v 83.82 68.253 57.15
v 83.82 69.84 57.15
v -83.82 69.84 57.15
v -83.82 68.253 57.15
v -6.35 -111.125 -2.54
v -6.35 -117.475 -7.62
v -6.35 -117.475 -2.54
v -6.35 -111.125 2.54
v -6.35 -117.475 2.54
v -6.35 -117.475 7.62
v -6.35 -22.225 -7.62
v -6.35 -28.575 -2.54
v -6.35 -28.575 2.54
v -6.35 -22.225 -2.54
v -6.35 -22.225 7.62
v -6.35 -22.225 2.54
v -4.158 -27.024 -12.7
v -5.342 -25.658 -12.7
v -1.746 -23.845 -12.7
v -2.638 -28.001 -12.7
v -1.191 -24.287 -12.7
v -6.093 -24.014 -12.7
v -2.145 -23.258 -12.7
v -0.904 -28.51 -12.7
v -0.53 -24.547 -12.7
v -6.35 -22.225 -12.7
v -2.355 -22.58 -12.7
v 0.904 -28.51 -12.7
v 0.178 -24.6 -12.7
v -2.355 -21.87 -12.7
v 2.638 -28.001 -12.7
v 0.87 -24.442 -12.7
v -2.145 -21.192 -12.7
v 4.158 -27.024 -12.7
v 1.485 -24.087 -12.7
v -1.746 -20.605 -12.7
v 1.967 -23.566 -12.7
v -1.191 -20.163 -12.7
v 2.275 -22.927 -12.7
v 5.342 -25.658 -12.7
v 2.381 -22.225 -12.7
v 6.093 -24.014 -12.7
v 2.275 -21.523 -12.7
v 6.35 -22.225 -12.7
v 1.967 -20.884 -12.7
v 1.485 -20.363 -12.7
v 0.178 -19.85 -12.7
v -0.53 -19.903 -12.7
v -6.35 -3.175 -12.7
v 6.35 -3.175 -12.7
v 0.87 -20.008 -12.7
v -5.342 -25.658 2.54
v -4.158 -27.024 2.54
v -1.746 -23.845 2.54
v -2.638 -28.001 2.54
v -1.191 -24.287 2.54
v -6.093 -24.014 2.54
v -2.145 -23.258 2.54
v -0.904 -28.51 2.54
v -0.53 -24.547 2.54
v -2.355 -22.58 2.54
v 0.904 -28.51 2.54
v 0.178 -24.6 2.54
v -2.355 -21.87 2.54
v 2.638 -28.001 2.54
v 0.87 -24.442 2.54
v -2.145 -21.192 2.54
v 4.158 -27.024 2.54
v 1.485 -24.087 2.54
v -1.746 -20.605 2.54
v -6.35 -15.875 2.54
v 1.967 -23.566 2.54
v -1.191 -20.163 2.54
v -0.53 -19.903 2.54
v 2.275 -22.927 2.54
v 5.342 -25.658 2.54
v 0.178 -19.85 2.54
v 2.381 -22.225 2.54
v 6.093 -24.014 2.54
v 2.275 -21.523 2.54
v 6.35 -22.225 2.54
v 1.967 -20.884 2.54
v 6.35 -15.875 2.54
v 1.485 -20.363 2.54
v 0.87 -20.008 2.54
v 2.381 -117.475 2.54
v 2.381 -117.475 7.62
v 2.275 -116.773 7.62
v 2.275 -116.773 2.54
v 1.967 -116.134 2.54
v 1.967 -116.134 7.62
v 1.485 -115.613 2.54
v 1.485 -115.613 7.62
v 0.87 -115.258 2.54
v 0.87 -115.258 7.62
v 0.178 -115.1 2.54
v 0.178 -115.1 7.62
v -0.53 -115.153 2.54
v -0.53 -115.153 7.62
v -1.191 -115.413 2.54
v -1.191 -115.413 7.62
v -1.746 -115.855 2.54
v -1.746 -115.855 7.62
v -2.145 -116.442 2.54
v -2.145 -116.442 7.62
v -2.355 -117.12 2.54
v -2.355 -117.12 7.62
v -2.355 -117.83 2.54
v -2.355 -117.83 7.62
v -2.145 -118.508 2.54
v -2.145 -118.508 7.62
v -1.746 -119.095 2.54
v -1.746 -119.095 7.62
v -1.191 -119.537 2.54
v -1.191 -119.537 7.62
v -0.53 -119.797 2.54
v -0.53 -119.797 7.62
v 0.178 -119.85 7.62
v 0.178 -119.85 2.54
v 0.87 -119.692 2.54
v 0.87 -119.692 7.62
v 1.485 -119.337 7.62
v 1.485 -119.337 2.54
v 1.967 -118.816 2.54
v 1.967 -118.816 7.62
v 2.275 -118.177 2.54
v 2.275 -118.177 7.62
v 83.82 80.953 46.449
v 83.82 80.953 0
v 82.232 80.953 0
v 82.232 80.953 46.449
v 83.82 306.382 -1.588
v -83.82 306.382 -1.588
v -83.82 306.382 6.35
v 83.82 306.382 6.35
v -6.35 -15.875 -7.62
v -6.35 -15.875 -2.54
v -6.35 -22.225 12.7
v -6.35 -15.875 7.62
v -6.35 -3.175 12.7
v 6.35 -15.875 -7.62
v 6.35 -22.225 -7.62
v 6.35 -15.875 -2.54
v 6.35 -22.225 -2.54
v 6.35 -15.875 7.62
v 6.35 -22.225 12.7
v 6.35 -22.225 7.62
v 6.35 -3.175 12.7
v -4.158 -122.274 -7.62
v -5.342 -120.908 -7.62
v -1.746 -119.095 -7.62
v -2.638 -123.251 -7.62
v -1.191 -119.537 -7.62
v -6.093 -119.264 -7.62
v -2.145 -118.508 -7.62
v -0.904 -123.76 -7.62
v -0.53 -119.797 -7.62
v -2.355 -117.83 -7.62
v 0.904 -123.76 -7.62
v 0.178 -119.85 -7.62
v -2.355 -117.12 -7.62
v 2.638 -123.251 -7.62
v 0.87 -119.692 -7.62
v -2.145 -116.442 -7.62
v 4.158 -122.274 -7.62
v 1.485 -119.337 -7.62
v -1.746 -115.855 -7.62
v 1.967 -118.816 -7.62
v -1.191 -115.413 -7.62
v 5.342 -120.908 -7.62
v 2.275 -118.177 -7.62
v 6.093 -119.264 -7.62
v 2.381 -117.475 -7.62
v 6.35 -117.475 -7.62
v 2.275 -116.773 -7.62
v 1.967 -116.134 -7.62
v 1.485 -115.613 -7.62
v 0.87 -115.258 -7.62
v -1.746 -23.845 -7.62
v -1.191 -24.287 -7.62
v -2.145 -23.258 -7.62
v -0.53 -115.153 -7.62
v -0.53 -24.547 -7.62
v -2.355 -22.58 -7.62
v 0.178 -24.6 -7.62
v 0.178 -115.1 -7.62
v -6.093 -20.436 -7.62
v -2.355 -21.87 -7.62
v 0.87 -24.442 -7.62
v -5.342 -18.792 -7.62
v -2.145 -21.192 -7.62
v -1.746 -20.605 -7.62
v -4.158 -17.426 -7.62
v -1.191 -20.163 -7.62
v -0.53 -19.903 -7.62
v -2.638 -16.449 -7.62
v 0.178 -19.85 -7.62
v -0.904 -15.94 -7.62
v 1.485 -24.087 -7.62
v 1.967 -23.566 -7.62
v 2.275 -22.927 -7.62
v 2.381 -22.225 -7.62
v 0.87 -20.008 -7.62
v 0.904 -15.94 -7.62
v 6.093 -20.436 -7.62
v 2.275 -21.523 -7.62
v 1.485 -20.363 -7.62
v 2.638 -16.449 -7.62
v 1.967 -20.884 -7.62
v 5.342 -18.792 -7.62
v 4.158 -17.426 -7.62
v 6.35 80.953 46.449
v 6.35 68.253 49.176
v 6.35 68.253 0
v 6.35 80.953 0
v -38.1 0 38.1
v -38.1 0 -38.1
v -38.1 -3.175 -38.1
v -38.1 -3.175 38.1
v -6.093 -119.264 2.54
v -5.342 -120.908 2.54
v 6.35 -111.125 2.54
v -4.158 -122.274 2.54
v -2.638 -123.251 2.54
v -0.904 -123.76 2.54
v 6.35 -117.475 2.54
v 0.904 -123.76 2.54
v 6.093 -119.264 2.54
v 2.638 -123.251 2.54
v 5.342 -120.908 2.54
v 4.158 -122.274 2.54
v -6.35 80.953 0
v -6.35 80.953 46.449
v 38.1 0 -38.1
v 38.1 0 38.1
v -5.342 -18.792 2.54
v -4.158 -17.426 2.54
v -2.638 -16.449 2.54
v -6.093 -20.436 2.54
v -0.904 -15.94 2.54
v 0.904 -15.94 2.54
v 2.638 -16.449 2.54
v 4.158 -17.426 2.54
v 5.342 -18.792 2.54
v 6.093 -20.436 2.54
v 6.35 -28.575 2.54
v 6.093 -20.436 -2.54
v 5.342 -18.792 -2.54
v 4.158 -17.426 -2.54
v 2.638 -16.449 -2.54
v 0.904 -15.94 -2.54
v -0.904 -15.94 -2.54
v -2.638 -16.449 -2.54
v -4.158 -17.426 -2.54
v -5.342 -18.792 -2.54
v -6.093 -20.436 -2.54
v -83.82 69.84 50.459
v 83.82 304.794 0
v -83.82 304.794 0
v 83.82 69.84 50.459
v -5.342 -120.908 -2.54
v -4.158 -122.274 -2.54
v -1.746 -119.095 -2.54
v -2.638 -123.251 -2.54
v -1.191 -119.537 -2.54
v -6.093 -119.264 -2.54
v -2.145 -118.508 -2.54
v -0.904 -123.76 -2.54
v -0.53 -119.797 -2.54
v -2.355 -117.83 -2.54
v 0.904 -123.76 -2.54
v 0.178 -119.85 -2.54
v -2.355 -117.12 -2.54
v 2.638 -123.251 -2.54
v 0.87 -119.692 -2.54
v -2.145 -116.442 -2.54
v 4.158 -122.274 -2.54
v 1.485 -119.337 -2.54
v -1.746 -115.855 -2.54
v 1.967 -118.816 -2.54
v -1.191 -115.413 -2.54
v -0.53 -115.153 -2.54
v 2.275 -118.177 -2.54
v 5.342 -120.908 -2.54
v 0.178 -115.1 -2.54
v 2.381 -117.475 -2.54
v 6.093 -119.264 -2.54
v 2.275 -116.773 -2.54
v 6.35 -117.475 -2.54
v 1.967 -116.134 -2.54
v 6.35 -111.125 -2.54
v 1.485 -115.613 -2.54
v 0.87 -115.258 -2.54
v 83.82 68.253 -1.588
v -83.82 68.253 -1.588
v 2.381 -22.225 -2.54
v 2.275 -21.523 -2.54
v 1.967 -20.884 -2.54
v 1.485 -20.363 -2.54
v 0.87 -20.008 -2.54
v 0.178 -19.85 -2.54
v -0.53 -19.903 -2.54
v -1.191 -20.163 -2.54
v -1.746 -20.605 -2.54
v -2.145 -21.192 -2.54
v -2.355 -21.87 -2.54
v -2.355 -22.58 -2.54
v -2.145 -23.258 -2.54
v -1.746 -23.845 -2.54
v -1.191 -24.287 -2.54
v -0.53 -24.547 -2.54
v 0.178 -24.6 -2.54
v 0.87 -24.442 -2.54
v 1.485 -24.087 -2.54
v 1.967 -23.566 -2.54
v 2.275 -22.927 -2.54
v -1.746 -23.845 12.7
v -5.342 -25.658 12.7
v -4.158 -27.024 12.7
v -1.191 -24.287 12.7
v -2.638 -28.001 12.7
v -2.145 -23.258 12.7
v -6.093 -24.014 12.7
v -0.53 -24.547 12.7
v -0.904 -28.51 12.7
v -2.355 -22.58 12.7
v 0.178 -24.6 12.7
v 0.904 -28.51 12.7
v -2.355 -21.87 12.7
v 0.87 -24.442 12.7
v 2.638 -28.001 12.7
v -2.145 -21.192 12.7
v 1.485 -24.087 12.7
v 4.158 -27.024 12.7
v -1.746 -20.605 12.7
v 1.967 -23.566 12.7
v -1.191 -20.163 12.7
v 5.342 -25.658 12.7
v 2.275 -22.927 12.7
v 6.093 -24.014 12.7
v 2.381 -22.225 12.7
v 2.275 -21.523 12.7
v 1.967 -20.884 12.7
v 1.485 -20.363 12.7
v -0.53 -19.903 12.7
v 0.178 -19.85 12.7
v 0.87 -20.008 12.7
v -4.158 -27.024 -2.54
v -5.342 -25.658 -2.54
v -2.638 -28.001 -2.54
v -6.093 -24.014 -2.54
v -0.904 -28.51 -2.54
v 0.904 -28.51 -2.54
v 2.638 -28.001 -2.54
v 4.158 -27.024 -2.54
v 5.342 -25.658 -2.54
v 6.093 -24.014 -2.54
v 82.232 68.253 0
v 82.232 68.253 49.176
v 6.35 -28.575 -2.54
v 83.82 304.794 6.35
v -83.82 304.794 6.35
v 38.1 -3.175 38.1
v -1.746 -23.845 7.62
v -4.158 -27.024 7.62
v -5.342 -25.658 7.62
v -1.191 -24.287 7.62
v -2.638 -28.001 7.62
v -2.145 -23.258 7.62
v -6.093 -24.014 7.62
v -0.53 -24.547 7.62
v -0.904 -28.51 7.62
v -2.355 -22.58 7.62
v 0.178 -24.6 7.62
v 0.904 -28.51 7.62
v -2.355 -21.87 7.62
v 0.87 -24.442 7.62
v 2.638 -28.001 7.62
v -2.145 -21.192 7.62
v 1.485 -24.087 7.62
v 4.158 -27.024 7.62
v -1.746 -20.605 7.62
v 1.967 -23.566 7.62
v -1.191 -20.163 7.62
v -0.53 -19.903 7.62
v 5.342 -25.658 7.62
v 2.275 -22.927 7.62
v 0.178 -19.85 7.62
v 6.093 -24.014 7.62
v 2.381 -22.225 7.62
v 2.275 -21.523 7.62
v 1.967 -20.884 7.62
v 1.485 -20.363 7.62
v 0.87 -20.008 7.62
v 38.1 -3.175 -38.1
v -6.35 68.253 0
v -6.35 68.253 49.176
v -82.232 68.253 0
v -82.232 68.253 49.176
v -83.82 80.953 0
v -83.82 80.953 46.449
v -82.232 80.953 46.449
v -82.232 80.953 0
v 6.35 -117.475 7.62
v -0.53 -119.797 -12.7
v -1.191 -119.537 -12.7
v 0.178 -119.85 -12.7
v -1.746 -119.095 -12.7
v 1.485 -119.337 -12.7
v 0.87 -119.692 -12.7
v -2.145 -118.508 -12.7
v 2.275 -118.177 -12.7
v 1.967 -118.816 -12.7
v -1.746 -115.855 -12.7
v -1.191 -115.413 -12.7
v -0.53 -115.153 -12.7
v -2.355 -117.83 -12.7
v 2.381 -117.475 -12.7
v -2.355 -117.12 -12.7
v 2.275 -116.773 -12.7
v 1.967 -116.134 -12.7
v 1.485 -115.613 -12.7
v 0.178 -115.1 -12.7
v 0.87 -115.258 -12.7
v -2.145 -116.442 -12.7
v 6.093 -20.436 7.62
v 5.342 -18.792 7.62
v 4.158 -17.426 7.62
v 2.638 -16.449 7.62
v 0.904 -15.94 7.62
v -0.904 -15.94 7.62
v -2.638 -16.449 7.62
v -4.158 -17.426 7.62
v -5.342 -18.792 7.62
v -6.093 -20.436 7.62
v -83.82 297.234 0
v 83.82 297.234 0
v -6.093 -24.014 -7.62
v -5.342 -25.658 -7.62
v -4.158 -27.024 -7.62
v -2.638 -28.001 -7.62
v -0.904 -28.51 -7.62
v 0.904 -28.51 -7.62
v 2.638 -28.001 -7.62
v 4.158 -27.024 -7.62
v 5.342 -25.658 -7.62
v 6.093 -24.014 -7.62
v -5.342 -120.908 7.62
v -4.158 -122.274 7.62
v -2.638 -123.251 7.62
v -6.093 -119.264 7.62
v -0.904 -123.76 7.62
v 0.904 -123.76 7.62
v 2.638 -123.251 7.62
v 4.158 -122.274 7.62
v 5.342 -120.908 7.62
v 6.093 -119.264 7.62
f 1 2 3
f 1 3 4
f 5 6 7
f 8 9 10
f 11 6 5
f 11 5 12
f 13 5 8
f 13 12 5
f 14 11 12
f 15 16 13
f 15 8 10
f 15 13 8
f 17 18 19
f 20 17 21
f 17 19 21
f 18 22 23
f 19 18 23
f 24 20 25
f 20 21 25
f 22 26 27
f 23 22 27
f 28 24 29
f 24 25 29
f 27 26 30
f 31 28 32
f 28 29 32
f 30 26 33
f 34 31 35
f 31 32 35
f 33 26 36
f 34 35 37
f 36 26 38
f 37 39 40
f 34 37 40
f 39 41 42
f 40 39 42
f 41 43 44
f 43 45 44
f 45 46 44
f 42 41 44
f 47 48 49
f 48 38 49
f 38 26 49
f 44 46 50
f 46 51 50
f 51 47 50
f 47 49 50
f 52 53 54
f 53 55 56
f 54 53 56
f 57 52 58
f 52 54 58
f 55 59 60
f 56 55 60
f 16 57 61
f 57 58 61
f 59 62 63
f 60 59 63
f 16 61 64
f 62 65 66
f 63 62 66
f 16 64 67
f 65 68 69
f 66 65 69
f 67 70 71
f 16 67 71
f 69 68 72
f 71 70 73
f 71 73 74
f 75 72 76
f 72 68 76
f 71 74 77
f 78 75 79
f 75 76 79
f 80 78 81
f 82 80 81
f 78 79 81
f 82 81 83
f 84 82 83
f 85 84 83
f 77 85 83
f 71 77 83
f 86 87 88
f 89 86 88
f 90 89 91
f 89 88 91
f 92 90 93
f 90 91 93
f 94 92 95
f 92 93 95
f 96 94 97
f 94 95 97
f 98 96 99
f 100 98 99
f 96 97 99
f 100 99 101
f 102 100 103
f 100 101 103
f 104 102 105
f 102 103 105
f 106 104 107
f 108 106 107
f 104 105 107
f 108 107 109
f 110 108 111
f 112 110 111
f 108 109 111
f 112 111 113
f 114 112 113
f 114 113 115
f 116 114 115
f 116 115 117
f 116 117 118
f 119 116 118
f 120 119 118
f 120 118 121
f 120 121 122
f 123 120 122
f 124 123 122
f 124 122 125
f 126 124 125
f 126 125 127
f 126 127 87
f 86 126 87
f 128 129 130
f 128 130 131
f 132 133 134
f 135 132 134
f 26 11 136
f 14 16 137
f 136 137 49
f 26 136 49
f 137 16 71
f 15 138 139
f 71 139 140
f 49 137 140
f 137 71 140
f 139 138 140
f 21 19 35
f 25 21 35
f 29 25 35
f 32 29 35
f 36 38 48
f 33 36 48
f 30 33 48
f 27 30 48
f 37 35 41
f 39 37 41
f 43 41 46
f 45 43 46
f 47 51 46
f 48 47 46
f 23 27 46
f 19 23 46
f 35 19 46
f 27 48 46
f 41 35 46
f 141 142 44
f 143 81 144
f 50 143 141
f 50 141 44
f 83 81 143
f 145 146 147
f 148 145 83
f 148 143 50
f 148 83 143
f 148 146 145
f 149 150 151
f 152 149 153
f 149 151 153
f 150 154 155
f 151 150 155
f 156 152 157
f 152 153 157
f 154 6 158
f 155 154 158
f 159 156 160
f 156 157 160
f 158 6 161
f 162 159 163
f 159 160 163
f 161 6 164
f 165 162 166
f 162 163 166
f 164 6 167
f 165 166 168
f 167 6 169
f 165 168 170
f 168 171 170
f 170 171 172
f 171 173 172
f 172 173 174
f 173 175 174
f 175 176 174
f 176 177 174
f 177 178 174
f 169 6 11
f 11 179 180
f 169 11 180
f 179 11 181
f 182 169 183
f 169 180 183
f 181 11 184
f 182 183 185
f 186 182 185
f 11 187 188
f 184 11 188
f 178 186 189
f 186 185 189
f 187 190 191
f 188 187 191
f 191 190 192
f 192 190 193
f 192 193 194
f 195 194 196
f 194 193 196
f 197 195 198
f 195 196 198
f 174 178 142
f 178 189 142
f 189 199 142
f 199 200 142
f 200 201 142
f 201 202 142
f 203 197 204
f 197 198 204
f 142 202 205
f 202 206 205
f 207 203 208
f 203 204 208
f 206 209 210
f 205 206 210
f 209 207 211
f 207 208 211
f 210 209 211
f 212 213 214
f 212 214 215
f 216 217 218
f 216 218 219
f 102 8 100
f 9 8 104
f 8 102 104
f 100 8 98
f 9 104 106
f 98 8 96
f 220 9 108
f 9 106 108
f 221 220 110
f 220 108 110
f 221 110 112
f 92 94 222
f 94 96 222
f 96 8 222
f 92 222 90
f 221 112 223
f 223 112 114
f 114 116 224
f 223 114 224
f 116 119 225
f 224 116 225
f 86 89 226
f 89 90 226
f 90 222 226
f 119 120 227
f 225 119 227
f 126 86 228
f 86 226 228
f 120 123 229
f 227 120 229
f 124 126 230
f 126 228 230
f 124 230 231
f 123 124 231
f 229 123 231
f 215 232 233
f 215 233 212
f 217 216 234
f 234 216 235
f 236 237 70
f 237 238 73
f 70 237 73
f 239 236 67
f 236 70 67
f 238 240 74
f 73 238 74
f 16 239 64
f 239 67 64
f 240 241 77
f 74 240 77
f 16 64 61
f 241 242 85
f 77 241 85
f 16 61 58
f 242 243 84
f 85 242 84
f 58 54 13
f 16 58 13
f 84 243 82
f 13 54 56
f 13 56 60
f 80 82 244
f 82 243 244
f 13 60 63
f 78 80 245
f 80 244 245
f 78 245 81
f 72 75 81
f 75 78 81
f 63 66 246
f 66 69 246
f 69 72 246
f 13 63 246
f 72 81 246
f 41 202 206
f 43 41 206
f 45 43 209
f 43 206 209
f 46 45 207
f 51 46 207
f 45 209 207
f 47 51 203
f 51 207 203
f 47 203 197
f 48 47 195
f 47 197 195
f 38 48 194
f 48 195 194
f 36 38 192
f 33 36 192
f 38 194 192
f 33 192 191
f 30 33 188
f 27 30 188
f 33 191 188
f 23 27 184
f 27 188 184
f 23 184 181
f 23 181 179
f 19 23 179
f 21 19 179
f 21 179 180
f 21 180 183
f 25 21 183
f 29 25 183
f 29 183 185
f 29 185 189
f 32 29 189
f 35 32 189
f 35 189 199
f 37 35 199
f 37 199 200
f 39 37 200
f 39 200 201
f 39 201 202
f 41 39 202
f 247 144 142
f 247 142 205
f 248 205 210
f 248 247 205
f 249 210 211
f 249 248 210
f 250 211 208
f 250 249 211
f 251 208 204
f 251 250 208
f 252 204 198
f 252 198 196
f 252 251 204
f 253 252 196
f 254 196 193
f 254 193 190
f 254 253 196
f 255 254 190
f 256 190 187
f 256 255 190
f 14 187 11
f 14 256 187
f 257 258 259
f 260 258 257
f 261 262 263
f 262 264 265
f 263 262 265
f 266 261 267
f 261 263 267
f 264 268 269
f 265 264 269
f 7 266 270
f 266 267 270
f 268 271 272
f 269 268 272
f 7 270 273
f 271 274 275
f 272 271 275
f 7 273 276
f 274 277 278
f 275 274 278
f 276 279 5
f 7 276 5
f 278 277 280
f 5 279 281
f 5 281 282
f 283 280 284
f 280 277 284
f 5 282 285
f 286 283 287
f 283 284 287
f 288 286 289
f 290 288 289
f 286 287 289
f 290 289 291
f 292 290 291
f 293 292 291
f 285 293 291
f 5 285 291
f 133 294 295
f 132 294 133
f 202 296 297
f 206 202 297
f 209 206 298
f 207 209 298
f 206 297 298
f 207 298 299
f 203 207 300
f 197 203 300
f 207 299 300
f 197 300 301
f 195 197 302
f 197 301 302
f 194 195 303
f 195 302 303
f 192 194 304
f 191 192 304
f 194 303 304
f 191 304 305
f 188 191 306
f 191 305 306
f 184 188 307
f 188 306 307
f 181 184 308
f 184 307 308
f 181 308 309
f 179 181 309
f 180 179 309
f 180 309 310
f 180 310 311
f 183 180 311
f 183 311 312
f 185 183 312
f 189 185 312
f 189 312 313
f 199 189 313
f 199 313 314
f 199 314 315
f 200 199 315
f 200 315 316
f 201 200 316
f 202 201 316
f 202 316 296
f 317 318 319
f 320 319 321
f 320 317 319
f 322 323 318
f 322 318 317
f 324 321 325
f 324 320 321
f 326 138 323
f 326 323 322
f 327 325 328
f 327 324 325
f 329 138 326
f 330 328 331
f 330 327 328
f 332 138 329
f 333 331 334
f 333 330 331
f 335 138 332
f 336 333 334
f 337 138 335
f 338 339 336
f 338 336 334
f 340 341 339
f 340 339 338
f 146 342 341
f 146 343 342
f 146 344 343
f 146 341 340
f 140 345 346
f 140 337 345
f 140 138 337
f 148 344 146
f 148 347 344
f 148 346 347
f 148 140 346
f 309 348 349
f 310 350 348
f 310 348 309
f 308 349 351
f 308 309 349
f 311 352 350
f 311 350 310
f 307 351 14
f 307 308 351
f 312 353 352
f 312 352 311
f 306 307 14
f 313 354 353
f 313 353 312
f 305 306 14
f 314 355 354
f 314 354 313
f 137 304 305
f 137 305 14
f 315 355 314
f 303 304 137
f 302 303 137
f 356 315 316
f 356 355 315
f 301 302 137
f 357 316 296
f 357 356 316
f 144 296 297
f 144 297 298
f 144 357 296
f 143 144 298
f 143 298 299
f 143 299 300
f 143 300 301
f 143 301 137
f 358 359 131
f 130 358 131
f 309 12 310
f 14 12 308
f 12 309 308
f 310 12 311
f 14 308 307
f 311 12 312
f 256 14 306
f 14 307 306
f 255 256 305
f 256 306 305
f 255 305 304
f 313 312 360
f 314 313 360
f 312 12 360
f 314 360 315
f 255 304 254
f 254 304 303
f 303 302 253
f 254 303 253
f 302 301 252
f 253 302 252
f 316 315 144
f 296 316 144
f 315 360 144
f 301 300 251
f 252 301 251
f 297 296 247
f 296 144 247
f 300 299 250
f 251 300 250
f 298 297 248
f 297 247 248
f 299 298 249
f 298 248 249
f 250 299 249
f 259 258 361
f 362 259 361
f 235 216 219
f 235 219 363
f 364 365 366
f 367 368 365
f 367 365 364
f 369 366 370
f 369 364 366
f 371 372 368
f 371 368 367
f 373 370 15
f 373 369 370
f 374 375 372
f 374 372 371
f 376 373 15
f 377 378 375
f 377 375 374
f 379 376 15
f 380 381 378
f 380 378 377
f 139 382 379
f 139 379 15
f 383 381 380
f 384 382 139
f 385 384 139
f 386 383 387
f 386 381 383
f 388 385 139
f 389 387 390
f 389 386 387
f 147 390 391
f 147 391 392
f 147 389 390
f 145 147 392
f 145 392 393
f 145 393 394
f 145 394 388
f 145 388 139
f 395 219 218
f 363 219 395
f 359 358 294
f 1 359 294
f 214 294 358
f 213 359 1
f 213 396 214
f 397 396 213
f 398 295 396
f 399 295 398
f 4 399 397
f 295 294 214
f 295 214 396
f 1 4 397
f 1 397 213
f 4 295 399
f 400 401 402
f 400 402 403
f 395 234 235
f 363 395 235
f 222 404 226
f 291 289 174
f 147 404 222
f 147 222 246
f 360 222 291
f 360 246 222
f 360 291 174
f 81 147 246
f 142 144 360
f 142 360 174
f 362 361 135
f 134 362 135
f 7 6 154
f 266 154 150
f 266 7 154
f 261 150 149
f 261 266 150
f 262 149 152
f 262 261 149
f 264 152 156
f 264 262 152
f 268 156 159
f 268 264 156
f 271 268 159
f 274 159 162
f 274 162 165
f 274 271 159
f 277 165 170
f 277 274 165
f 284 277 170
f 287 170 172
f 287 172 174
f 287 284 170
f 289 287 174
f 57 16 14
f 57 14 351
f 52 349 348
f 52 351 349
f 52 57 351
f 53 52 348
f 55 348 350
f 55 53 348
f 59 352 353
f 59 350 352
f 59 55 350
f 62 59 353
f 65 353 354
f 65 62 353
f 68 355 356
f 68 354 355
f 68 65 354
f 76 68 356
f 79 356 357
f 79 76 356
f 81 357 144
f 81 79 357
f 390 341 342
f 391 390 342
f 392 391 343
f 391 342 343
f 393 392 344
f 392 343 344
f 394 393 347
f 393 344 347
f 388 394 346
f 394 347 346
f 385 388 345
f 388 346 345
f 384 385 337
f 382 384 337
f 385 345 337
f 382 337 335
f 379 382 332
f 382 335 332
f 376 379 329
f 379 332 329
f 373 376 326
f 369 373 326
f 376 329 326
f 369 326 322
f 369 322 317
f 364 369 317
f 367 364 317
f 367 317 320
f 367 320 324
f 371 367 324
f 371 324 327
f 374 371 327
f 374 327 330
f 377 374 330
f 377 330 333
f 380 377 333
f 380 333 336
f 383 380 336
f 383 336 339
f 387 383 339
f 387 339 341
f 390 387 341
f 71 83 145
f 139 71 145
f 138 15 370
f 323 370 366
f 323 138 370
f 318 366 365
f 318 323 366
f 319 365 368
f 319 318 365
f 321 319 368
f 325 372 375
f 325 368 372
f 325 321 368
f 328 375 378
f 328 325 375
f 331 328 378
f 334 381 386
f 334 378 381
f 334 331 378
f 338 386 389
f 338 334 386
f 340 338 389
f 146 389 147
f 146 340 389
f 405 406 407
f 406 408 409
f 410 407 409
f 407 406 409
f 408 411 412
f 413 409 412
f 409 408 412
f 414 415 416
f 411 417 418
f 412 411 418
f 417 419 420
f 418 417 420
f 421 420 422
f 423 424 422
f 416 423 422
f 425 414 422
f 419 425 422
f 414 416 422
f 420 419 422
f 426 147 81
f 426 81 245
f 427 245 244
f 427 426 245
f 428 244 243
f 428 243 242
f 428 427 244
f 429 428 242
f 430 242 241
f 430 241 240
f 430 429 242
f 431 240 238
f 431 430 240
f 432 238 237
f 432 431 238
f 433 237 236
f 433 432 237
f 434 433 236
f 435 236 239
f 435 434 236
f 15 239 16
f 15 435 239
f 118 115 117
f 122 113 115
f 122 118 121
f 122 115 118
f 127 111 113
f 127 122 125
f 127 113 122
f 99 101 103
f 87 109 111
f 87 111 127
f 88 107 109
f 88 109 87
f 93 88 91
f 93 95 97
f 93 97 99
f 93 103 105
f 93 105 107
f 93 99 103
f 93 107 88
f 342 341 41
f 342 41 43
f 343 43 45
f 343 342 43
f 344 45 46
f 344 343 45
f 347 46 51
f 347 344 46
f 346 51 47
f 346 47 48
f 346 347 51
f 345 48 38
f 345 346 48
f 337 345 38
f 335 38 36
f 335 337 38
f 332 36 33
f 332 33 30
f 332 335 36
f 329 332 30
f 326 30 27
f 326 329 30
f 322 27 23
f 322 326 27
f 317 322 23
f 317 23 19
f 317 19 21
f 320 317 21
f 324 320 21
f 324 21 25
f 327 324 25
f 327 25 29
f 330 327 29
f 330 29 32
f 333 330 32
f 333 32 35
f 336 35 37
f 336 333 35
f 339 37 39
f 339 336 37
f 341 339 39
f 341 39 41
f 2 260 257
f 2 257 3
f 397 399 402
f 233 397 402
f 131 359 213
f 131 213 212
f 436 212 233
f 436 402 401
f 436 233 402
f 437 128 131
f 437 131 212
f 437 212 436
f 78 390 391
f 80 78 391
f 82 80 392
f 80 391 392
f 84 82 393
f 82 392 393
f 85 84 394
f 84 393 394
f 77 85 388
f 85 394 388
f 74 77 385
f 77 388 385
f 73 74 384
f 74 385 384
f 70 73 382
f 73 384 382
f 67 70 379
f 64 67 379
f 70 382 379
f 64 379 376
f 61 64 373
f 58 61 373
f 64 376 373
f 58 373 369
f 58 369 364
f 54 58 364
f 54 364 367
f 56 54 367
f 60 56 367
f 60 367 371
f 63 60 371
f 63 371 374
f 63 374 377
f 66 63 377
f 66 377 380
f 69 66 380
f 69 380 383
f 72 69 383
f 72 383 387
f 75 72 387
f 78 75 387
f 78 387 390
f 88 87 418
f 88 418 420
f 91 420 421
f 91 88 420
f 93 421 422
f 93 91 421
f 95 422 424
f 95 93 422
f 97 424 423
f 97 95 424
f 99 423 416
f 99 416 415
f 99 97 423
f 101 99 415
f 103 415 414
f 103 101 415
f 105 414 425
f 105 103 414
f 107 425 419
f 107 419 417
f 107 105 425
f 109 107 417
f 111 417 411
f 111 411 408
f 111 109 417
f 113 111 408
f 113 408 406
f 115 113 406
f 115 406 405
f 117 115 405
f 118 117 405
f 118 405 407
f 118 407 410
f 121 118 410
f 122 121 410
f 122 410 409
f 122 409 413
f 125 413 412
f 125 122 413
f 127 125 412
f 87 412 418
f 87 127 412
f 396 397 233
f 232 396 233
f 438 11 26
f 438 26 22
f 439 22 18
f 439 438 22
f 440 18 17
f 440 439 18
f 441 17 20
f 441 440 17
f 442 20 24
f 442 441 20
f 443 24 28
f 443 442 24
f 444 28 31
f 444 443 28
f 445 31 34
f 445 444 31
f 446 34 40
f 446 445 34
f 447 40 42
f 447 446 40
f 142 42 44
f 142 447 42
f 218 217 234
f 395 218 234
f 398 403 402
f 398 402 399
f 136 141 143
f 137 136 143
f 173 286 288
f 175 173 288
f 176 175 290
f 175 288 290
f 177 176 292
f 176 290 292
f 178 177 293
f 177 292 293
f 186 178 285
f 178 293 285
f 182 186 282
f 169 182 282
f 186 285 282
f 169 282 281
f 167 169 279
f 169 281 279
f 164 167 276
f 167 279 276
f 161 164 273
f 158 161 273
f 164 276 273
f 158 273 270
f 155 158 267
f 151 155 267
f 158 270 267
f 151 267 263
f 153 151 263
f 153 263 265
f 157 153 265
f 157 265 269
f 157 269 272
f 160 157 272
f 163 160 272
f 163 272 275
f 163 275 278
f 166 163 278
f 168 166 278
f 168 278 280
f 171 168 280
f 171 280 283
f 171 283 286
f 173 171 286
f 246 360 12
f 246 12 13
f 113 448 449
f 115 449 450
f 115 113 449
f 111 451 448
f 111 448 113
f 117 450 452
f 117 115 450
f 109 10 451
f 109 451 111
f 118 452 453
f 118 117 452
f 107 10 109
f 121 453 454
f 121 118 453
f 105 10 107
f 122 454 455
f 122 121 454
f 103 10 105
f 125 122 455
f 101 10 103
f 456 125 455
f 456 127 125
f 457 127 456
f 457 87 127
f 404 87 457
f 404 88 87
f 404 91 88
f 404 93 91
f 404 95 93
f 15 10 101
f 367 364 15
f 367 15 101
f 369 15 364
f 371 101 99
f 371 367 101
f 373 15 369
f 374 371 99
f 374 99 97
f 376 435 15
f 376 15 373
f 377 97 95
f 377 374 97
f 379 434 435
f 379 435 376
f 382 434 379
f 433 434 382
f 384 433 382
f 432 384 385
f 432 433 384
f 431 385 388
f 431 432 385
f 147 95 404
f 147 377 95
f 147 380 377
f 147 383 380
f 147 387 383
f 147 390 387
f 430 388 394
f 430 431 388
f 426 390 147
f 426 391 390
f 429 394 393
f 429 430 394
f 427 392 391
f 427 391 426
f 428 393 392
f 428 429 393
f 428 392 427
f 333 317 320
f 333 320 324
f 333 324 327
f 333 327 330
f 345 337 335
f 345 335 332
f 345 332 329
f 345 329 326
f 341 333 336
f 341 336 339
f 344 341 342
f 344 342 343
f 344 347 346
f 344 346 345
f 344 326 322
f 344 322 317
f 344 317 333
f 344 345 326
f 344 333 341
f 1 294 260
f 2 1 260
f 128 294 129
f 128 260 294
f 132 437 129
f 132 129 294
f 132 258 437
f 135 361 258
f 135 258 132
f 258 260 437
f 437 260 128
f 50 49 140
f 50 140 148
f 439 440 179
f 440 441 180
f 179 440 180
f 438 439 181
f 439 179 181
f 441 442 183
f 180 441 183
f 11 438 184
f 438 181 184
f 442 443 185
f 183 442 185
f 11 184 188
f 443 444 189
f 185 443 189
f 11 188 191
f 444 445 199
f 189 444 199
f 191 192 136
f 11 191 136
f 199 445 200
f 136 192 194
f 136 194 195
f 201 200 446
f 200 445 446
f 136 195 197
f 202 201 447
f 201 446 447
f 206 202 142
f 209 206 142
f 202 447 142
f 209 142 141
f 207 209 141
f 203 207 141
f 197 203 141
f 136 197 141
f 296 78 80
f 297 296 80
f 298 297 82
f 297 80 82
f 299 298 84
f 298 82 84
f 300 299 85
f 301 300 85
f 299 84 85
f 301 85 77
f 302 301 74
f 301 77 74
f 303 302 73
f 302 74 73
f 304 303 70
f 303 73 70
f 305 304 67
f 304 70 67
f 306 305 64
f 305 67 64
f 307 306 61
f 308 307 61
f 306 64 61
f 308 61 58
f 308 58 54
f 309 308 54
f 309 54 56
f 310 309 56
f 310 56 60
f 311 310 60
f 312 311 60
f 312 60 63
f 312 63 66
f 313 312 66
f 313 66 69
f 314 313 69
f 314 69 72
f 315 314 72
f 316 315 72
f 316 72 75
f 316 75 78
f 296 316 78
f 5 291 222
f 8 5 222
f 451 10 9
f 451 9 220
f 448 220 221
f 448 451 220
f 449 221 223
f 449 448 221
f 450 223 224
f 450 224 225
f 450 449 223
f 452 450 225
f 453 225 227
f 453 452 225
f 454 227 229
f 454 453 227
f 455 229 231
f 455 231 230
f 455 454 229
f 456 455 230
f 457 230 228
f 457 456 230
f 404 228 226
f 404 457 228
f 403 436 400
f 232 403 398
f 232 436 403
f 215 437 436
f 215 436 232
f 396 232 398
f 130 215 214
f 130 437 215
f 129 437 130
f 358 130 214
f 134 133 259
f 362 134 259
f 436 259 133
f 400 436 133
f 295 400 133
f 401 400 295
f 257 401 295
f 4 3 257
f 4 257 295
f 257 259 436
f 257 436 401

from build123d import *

# Parameters (mm, degrees)
F0_W          = 76.2
F0_H          = 76.2
F1_DEPTH      = 3.175
F2_W          = 12.7
F2_H          = 19.05
F3_DEPTH      = 12.7
F4_W          = 12.7
F4_H          = 5.08
F5_DEPTH      = 38.101
F5_DEPTH_BACK = 38.101
F6_W          = 12.7
F6_H          = 19.05
F7_DEPTH      = 7.62
F8_W          = 6.35
F8_H          = 5.08
F9_DEPTH      = 25.4
F10_R         = 2.38125
F11_DEPTH     = 50.801
F12_DEPTH     = 76.2
F14_DEPTH     = 15.24
F15_W         = 6.35
F15_H         = 5.08
F16_DEPTH     = 44.451
F17_R         = 2.38125
F18_DEPTH     = 45.721
F19_W         = 12.7
F19_H         = 12.7
F20_DEPTH     = 50.8
F22_DEPTH     = 44.451
F23_W         = 1.5875
F23_H         = 6.35
F24_DEPTH     = 83.82
F26_DEPTH     = 1.5875
F28_DEPTH     = 1.5875
F29_R         = 2.38125
F30_DEPTH     = 25.4
F31_R         = 2.38125
F32_DEPTH     = 20.32


with BuildPart() as f1:
    # F0 (on Front) → F1 (new body)
    with BuildSketch(Plane.XZ):
        Rectangle(F0_W, F0_H)
    extrude(amount=F1_DEPTH)


with BuildPart() as f3:
    # F2 (on Top) → F3 (new body, symmetric)
    with BuildSketch(Plane.XY):
        with Locations((0, -12.7)):
            Rectangle(F2_W, F2_H)
        with BuildLine():
            ThreePointArc((-6.35, -22.225), (0, -28.575), (6.35, -22.225))
            Line((6.35, -22.225), (-6.35, -22.225))
        make_face()
    extrude(amount=F3_DEPTH, both=True)

    # F4 (on Right) → F5 (cut, two sides)
    with BuildSketch(Plane.YZ) as f5_sk:
        with Locations((-22.225, 5.08)):
            Rectangle(F4_W, F4_H)
        with Locations((-22.225, -5.08)):
            Rectangle(F4_W, F4_H)
    extrude(amount=-F5_DEPTH, mode=Mode.SUBTRACT)
    extrude(f5_sk.sketch, amount=F5_DEPTH_BACK, mode=Mode.SUBTRACT)


with BuildPart() as f7:
    # F6 (on Top) → F7 (new body, symmetric)
    with BuildSketch(Plane.XY):
        with BuildLine():
            Line((-6.35, -22.225), (6.35, -22.225))
            ThreePointArc((6.35, -22.225), (0, -15.875), (-6.35, -22.225))
        make_face()
        with Locations((0, -31.75)):
            Rectangle(F6_W, F6_H)
    extrude(amount=F7_DEPTH, both=True)

    # F8 (on face) → F9 (cut)
    with BuildSketch(Plane.YZ.offset(6.35)):
        Polygon((-3.175, 12.7), (-22.225, 12.7), (-22.225, 7.62), (-15.875, 7.62), (-15.875, 2.54), (-22.225, 2.54), (-22.225, -2.54), (-15.875, -2.54), (-15.875, -7.62), (-22.225, -7.62), (-22.225, -12.7), (-3.175, -12.7), align=None)
        with Locations((-25.4, 0)):
            Rectangle(F8_W, F8_H)
    extrude(amount=-F9_DEPTH, mode=Mode.SUBTRACT)


with BuildPart() as f11_tool:
    # F10 (on face) → F11 (new body, through all)
    with BuildSketch(Plane.XY.offset(12.7)):
        with Locations((0, -22.225)):
            Circle(F10_R)
    extrude(amount=-F11_DEPTH)


with BuildPart() as f3_1:
    add(f3.part)

    # F11: cut by f11_tool
    add(f11_tool.part, mode=Mode.SUBTRACT)


with BuildPart() as f7_1:
    add(f7.part)

    # F11: cut by f11_tool
    add(f11_tool.part, mode=Mode.SUBTRACT)

    # F12 (add): a face of the model
    f12_faces = [f7_1.faces().sort_by_distance(p)[0] for p in [
        (0, -41.275, 0),
    ]]
    extrude(f12_faces, amount=F12_DEPTH)

    # F13 (on face) → F14 (join)
    with BuildSketch(Plane.XY.offset(7.62)):
        with BuildLine():
            Line((6.35, -117.475), (-6.35, -117.475))
            ThreePointArc((-6.35, -117.475), (0, -123.825), (6.35, -117.475))
        make_face()
    extrude(amount=-F14_DEPTH)

    # F15 (on face) → F16 (cut, through all)
    with BuildSketch(Plane.YZ.offset(6.35)):
        with Locations((-120.65, 0)):
            Rectangle(F15_W, F15_H)
        with Locations((-114.3, 0)):
            Rectangle(F15_W, F15_H)
    extrude(amount=-F16_DEPTH, mode=Mode.SUBTRACT)

    # F17 (on face) → F18 (cut, through all)
    with BuildSketch(Plane.XY.offset(7.62)):
        with Locations((0, -117.475)):
            Circle(F17_R)
    extrude(amount=-F18_DEPTH, mode=Mode.SUBTRACT)


with BuildPart() as f20:
    # F19 (on Top) → F20 (new body)
    with BuildSketch(Plane.XY):
        with Locations((0, 74.602655525)):
            Rectangle(F19_W, F19_H)
    extrude(amount=F20_DEPTH)

    # F21 (on face) → F22 (cut, through all)
    with BuildSketch(Plane.YZ.offset(6.35)):
        Polygon((68.252655525, 56.2568344176), (68.252655525, 50.8), (80.952655525, 48.0725299054), (81.430234015, 56.2568344176), align=None)
    extrude(amount=-F22_DEPTH, mode=Mode.SUBTRACT)

    # F23 (on Right) → F24 (join, symmetric)
    with BuildSketch(Plane.YZ):
        Polygon((297.2337353981, 0), (68.252655525, 0), (68.252655525, -1.5875), (306.3817041481, -1.5875), (306.3817041481, 0), (304.7942041481, 0), align=None)
        Polygon((68.252655525, 49.1763029593), (297.2337353981, 0), (304.7942041481, 0), (69.840155525, 50.4590662382), (68.252655525, 50.8), align=None)
        with Locations((305.5879541481, 3.175)):
            Rectangle(F23_W, F23_H)
        Polygon((68.252655525, 50.8), (69.840155525, 50.4590662382), (69.840155525, 57.15), (68.252655525, 57.15), align=None)
    extrude(amount=F24_DEPTH, both=True)

    # F25 (on face) → F26 (join)
    with BuildSketch(Plane.YZ.offset(83.82)):
        Polygon((80.952655525, 0), (80.952655525, 46.4488328647), (68.252655525, 49.1763029593), (68.252655525, 0), align=None)
    extrude(amount=-F26_DEPTH)

    # F27 (on face) → F28 (join)
    with BuildSketch(Plane(origin=(-83.82, 0, 0), x_dir=(0, -1, 0), z_dir=(-1, 0, 0))):
        Polygon((-80.952655525, 0), (-68.252655525, 0), (-68.252655525, 49.1763029593), (-80.952655525, 46.4488328647), align=None)
    extrude(amount=-F28_DEPTH)


with BuildPart() as f30:
    # F29 (on face) → F30 (new body)
    with BuildSketch(Plane.XY.offset(12.7)):
        with Locations((0, -22.225)):
            Circle(F29_R)
    extrude(amount=-F30_DEPTH)


with BuildPart() as f32:
    # F31 (on face) → F32 (new body)
    with BuildSketch(Plane.XY.offset(7.62)):
        with Locations((0, -117.475)):
            Circle(F31_R)
    extrude(amount=-F32_DEPTH)


solid = Compound([f1.part, f3_1.part, f7_1.part, f20.part, f30.part, f32.part])
